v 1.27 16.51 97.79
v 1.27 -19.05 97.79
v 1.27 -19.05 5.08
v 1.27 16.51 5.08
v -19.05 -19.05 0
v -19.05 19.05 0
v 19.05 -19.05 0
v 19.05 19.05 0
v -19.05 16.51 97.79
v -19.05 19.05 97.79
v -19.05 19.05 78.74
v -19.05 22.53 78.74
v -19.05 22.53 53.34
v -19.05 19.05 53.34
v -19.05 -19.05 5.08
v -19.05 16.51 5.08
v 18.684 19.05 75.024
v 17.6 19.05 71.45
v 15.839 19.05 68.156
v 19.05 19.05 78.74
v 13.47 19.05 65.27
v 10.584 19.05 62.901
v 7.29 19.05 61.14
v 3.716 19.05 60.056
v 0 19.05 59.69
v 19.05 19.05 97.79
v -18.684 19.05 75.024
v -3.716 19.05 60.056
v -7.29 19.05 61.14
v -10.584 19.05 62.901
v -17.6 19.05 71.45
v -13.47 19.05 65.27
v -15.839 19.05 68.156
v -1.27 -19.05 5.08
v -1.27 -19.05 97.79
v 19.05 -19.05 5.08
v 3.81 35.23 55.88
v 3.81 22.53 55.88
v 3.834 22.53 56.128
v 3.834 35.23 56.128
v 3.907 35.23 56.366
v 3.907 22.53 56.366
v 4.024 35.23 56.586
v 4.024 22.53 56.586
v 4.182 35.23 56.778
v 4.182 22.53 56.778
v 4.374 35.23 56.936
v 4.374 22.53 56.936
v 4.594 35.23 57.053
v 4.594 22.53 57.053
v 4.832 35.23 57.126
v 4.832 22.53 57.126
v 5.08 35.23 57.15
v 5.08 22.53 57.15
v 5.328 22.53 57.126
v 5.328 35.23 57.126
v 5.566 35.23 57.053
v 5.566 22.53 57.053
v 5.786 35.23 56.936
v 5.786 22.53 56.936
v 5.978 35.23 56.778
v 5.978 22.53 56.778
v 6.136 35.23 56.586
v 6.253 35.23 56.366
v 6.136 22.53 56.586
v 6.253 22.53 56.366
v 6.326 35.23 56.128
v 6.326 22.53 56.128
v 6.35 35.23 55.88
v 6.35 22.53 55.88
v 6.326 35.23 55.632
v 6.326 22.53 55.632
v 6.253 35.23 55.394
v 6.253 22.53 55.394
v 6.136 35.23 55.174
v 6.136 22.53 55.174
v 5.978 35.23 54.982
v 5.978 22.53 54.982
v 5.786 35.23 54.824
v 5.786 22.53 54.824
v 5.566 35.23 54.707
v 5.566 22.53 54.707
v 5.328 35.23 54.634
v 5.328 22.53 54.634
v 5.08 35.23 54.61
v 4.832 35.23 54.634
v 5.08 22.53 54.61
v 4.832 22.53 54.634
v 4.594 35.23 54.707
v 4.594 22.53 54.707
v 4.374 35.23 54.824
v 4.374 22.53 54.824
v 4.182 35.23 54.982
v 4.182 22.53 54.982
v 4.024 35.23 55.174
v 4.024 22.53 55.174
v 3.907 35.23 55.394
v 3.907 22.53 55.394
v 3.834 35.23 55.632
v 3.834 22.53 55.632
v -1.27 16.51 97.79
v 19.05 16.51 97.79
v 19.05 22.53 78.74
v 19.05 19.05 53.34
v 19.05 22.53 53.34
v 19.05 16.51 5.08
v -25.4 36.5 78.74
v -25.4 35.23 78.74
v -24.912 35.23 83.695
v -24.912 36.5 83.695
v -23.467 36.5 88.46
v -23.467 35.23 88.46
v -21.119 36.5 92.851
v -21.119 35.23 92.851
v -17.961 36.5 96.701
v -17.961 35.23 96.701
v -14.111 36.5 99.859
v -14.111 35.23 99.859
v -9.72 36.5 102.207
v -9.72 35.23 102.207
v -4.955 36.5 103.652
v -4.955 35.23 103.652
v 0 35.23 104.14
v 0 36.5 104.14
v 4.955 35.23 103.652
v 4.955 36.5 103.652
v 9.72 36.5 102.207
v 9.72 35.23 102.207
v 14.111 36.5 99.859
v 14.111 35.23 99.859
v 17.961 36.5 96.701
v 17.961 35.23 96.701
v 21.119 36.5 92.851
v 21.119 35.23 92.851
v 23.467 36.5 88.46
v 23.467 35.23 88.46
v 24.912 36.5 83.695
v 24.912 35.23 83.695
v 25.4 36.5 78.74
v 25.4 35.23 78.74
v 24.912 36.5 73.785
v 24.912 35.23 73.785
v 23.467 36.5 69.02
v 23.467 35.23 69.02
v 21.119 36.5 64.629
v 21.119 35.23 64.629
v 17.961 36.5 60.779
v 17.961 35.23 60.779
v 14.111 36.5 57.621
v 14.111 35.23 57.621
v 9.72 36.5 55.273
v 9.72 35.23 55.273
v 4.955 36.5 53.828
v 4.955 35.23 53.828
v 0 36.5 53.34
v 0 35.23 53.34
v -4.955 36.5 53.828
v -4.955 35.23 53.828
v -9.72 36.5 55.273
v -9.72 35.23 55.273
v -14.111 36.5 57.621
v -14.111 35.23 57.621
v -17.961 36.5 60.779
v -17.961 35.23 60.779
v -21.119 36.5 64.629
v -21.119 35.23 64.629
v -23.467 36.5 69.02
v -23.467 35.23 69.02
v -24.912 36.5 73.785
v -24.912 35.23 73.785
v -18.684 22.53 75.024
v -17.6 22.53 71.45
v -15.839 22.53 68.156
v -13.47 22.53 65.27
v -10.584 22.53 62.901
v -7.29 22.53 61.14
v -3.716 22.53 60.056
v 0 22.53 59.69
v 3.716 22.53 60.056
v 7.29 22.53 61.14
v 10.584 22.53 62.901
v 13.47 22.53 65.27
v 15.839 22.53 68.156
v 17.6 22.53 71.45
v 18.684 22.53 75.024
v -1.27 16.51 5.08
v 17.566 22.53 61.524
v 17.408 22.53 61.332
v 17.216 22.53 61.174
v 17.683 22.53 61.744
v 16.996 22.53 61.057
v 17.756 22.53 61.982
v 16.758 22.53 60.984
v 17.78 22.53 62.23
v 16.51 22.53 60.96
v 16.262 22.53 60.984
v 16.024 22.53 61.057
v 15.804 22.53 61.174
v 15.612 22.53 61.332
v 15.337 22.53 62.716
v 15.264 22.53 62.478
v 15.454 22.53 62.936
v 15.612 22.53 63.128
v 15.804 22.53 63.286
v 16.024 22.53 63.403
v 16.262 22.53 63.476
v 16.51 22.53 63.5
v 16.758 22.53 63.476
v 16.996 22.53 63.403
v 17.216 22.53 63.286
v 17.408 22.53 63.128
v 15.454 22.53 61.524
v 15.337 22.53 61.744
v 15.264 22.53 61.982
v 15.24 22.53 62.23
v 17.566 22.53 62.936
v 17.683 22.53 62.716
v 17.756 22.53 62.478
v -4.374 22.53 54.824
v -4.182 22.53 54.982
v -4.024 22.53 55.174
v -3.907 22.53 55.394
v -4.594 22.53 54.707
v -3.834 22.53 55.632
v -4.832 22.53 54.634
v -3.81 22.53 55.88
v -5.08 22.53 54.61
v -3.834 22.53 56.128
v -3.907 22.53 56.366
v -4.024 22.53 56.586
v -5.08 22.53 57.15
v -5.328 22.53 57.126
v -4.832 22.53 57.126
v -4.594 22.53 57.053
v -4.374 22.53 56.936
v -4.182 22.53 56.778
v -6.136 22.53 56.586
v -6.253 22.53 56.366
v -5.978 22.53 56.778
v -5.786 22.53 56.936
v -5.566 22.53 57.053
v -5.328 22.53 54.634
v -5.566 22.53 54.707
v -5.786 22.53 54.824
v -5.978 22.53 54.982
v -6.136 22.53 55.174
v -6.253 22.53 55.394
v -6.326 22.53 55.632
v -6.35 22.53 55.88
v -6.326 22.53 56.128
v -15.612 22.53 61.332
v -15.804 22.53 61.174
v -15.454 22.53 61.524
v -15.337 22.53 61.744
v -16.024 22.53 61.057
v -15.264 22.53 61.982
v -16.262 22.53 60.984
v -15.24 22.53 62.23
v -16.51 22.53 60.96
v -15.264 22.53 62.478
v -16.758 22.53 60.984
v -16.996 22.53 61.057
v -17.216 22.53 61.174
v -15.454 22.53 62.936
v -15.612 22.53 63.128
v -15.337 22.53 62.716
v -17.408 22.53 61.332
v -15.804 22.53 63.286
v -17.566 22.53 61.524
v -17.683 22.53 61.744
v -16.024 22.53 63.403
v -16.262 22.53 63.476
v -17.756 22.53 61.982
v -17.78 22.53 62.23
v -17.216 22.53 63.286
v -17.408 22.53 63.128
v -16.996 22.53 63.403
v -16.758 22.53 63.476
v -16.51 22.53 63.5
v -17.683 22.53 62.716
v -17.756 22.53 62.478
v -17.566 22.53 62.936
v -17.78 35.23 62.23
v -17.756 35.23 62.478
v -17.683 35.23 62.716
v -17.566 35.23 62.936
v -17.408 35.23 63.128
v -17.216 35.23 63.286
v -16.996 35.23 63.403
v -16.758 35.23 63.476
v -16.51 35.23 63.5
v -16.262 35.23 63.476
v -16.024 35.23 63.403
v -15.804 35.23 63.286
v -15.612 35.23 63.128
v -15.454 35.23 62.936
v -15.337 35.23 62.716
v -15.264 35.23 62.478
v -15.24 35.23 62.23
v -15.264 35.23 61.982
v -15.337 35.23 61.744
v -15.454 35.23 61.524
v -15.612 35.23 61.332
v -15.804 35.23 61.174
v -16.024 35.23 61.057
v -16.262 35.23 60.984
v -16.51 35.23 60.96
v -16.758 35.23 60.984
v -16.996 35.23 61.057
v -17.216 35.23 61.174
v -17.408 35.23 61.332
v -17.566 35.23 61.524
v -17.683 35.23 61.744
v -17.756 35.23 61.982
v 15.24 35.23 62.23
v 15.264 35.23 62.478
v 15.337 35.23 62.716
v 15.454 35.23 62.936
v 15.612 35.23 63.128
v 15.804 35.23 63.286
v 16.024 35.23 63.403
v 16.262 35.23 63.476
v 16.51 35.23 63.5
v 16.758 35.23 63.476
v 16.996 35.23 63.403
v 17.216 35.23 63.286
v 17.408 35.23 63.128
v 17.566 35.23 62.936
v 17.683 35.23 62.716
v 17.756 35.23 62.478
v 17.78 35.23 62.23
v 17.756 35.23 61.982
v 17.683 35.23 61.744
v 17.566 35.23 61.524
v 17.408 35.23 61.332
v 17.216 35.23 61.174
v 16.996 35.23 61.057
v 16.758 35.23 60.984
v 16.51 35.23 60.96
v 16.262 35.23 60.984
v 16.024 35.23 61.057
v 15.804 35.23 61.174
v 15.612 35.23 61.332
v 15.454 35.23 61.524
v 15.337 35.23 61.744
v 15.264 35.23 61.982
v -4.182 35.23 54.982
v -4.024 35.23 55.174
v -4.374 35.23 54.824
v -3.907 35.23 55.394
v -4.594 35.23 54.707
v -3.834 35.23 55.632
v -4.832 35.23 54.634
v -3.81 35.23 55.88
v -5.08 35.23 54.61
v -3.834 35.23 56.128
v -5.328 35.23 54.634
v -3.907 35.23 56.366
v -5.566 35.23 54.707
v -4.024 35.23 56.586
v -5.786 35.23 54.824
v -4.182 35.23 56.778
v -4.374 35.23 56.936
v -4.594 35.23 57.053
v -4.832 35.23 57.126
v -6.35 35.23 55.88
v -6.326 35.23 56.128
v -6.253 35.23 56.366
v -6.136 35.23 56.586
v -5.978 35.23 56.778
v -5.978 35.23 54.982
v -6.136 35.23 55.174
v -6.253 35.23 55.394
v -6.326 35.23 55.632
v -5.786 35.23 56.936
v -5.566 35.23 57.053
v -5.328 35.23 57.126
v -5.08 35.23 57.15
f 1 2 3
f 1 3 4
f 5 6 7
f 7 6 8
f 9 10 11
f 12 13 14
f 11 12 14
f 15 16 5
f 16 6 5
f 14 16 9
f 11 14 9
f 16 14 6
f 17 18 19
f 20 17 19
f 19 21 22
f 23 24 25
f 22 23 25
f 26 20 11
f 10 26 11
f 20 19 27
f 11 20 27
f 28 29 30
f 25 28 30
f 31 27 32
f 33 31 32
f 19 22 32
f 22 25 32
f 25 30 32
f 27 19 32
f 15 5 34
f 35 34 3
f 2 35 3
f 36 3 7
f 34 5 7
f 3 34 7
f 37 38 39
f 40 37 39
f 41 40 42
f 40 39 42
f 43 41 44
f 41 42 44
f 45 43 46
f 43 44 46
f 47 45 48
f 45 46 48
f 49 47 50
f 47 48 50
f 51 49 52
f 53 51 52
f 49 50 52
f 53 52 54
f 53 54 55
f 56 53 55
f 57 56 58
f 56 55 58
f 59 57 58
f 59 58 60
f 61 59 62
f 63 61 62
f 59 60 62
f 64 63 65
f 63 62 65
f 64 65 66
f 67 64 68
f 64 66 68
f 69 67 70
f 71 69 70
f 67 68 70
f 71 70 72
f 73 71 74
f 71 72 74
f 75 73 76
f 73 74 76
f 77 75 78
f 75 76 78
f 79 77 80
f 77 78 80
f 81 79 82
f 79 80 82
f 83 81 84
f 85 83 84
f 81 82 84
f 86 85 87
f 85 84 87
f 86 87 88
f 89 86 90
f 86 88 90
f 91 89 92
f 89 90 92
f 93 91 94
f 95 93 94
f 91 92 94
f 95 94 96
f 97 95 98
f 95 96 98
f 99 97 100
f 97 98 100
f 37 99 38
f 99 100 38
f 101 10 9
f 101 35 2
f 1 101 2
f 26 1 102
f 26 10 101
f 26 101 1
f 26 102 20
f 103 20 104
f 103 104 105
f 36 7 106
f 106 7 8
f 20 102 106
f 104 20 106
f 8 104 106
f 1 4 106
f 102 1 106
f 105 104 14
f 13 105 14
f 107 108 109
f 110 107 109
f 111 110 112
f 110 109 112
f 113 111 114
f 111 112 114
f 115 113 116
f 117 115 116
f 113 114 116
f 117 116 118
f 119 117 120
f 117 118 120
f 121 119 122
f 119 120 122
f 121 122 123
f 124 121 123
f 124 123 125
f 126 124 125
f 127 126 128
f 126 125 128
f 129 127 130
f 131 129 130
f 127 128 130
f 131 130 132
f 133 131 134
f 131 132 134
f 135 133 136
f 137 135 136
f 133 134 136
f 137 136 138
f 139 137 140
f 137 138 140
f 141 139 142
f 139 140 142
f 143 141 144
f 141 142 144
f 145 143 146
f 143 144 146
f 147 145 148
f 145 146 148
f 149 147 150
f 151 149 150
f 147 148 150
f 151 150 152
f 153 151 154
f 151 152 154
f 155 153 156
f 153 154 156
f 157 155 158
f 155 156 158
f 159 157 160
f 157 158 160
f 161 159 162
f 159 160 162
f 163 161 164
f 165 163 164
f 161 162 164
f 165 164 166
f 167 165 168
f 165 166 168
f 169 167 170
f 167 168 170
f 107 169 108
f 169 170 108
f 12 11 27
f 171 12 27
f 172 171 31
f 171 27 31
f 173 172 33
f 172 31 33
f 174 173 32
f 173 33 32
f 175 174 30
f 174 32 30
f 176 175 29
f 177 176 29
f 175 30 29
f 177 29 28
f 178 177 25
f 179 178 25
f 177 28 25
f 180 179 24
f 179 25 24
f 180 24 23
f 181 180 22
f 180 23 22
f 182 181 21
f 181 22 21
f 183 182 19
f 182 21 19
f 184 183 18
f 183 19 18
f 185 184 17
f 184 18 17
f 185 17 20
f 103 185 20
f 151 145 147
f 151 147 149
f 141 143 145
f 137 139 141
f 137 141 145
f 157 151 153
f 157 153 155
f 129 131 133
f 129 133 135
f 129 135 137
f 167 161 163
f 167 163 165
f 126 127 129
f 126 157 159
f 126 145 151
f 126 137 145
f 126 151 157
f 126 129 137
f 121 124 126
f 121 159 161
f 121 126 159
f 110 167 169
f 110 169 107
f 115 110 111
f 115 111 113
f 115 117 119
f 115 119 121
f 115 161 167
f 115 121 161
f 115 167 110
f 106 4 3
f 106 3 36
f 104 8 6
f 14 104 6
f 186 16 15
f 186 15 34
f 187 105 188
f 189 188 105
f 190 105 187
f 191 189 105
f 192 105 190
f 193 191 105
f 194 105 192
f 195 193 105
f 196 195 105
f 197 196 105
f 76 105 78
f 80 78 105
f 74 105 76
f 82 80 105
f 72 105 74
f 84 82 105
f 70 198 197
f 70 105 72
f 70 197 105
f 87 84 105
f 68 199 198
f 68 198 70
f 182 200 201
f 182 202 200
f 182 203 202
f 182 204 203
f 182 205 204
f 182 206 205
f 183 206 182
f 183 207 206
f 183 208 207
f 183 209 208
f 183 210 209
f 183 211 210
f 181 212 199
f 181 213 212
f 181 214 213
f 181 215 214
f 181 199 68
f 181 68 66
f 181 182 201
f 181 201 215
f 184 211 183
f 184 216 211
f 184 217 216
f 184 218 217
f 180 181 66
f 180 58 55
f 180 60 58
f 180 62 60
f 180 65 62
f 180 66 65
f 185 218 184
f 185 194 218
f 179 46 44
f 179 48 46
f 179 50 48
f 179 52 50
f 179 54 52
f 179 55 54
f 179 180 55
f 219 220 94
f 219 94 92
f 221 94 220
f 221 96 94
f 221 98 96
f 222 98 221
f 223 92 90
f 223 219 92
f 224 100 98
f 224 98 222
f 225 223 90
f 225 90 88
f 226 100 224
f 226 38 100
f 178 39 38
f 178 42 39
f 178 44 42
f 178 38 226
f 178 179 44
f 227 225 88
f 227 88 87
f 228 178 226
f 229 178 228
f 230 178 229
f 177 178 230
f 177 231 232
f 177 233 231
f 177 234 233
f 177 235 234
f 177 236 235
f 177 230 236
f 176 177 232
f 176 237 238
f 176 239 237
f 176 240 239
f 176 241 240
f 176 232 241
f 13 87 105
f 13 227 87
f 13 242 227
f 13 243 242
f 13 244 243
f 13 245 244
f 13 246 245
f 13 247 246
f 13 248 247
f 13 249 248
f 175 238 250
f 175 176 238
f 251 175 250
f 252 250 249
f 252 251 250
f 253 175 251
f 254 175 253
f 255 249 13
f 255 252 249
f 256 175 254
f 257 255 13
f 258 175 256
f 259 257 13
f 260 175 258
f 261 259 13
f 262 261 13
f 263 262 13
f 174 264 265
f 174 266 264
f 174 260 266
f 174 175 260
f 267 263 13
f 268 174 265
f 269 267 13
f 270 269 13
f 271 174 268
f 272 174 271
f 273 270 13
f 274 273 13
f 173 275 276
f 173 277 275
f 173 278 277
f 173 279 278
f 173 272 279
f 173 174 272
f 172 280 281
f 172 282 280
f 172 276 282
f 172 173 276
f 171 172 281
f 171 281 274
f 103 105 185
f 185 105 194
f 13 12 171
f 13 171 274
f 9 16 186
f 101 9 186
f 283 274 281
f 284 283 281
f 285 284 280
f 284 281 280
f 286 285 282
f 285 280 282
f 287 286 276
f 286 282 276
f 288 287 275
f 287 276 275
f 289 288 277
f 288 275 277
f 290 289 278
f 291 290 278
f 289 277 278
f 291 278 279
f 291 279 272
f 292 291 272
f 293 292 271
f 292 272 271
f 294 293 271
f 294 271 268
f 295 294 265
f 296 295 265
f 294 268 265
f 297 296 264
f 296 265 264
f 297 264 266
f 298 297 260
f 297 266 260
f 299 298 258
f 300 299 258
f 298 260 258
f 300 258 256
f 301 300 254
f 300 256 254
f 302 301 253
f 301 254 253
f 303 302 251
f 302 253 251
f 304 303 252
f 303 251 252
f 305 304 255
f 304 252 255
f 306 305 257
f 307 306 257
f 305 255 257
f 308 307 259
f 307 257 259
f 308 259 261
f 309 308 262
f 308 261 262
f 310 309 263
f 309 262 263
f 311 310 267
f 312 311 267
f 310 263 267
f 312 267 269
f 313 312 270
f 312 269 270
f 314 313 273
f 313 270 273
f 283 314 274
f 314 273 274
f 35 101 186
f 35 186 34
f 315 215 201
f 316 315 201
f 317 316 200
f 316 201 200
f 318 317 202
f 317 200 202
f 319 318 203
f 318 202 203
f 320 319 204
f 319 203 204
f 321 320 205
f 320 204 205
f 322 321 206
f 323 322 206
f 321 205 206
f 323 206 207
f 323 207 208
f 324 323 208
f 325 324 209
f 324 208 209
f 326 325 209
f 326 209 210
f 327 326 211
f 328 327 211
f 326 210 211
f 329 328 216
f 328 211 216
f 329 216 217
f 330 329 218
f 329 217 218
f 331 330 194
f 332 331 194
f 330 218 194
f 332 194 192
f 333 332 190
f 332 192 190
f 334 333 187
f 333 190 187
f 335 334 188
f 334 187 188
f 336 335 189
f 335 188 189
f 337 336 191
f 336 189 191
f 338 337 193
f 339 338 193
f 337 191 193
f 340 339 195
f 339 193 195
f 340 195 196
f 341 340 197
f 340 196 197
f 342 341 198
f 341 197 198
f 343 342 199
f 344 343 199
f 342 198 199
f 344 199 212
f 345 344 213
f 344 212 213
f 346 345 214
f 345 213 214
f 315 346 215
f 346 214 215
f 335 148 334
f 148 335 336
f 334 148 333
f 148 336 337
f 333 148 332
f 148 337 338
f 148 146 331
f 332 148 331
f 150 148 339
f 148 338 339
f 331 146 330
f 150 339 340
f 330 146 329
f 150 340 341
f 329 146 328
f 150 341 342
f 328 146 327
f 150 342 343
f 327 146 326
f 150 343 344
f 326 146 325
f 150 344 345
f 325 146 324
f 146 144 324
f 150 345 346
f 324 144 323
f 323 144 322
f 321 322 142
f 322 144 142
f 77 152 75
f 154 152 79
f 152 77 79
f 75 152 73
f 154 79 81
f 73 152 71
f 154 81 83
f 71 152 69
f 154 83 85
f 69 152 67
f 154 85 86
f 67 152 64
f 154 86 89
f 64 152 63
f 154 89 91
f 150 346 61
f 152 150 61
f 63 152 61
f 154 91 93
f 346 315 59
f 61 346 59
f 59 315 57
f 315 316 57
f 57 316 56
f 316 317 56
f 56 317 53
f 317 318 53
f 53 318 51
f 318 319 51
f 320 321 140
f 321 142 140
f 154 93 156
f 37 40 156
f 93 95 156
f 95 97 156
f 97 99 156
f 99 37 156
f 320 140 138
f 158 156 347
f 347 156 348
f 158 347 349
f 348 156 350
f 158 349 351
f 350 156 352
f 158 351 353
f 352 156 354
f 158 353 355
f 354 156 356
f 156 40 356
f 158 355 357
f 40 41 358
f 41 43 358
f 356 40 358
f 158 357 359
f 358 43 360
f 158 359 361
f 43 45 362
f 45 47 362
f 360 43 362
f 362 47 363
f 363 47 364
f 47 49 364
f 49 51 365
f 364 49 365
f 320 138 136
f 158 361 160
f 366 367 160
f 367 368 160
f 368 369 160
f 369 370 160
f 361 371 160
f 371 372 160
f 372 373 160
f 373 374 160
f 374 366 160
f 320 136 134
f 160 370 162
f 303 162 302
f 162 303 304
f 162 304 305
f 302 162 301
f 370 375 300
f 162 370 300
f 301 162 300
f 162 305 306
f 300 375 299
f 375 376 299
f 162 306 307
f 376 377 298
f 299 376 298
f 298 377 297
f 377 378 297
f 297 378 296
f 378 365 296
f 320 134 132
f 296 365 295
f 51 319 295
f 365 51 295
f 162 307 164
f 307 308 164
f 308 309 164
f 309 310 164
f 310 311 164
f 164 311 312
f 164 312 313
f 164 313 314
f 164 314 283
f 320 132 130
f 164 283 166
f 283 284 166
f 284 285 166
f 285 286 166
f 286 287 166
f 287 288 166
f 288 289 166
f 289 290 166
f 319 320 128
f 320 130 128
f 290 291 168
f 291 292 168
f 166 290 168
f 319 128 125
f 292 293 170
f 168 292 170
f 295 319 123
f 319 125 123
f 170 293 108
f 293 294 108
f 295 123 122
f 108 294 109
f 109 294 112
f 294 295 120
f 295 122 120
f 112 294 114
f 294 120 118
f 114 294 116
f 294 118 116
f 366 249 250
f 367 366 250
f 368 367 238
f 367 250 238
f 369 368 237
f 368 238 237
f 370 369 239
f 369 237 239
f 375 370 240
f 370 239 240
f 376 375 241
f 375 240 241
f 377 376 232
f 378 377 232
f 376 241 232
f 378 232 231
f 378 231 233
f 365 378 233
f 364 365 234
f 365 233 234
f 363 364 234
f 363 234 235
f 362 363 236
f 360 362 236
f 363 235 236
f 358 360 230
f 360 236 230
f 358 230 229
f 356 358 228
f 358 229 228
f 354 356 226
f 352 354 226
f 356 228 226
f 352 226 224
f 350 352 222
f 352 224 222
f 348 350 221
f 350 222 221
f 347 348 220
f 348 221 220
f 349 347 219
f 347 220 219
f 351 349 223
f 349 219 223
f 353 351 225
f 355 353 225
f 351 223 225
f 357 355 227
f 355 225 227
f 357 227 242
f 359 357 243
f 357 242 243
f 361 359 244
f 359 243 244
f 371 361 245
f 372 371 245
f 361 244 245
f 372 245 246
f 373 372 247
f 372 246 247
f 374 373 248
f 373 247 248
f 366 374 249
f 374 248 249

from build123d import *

# Parameters (mm, degrees)
F0_W      = 38.1
F0_H      = 38.1
F1_DEPTH  = 5.08
F3_DEPTH  = 92.71
F5_DEPTH  = 3.4798
F7_R      = 25.4
F8_DEPTH  = 1.27
F9_R      = 1.27
F10_DEPTH = 12.7


with BuildPart() as f1:
    # F0 (on Top) → F1 (new body)
    with BuildSketch(Plane.XY):
        Rectangle(F0_W, F0_H)
    extrude(amount=F1_DEPTH)

    # F2 (on face) → F3 (join)
    with BuildSketch(Plane.XY.offset(5.08)):
        Polygon((19.05, 19.05), (1.27, 19.05), (-1.27, 19.05), (-19.05, 19.05), (-19.05, 16.51), (-1.27, 16.51), (-1.27, -19.05), (1.27, -19.05), (1.27, 16.51), (19.05, 16.51), align=None)
    extrude(amount=F3_DEPTH)

    # F4 (on face) → F5 (join)
    with BuildSketch(Plane(origin=(0, 19.05, 0), x_dir=(-1, 0, 0), z_dir=(0, 1, 0))):
        with BuildLine():
            ThreePointArc((19.05, 78.74), (0, 59.69), (-19.05, 78.74))
            Line((-19.05, 78.74), (-19.05, 59.69))
            Line((-19.05, 59.69), (-19.05, 53.34))
            Line((-19.05, 53.34), (19.05, 53.34))
            Line((19.05, 53.34), (19.05, 59.69))
            Line((19.05, 59.69), (19.05, 78.74))
        make_face()
    extrude(amount=F5_DEPTH)



with BuildPart() as f8:
    # F7 (on offset) → F8 (new body)
    with BuildSketch(Plane(origin=(0, 35.2298, 0), x_dir=(-1, 0, 0), z_dir=(0, 1, 0))):
        with Locations((0, 78.74)):
            Circle(F7_R)
    extrude(amount=F8_DEPTH)


with BuildPart() as f1_1:
    add(f1.part)

    add(f8.part)  # F10 merges F8
    # F9 (on face) → F10 (join, through all)
    with BuildSketch(Plane(origin=(0, 22.5298, 0), x_dir=(-1, 0, 0), z_dir=(0, 1, 0))):
        with Locations((-5.08, 55.88)):
            Circle(F9_R)
        with Locations((5.08, 55.88)):
            Circle(F9_R)
        with Locations((-16.51, 62.23)):
            Circle(F9_R)
        with Locations((16.51, 62.23)):
            Circle(F9_R)
    extrude(amount=F10_DEPTH)


solid = f1_1.part
